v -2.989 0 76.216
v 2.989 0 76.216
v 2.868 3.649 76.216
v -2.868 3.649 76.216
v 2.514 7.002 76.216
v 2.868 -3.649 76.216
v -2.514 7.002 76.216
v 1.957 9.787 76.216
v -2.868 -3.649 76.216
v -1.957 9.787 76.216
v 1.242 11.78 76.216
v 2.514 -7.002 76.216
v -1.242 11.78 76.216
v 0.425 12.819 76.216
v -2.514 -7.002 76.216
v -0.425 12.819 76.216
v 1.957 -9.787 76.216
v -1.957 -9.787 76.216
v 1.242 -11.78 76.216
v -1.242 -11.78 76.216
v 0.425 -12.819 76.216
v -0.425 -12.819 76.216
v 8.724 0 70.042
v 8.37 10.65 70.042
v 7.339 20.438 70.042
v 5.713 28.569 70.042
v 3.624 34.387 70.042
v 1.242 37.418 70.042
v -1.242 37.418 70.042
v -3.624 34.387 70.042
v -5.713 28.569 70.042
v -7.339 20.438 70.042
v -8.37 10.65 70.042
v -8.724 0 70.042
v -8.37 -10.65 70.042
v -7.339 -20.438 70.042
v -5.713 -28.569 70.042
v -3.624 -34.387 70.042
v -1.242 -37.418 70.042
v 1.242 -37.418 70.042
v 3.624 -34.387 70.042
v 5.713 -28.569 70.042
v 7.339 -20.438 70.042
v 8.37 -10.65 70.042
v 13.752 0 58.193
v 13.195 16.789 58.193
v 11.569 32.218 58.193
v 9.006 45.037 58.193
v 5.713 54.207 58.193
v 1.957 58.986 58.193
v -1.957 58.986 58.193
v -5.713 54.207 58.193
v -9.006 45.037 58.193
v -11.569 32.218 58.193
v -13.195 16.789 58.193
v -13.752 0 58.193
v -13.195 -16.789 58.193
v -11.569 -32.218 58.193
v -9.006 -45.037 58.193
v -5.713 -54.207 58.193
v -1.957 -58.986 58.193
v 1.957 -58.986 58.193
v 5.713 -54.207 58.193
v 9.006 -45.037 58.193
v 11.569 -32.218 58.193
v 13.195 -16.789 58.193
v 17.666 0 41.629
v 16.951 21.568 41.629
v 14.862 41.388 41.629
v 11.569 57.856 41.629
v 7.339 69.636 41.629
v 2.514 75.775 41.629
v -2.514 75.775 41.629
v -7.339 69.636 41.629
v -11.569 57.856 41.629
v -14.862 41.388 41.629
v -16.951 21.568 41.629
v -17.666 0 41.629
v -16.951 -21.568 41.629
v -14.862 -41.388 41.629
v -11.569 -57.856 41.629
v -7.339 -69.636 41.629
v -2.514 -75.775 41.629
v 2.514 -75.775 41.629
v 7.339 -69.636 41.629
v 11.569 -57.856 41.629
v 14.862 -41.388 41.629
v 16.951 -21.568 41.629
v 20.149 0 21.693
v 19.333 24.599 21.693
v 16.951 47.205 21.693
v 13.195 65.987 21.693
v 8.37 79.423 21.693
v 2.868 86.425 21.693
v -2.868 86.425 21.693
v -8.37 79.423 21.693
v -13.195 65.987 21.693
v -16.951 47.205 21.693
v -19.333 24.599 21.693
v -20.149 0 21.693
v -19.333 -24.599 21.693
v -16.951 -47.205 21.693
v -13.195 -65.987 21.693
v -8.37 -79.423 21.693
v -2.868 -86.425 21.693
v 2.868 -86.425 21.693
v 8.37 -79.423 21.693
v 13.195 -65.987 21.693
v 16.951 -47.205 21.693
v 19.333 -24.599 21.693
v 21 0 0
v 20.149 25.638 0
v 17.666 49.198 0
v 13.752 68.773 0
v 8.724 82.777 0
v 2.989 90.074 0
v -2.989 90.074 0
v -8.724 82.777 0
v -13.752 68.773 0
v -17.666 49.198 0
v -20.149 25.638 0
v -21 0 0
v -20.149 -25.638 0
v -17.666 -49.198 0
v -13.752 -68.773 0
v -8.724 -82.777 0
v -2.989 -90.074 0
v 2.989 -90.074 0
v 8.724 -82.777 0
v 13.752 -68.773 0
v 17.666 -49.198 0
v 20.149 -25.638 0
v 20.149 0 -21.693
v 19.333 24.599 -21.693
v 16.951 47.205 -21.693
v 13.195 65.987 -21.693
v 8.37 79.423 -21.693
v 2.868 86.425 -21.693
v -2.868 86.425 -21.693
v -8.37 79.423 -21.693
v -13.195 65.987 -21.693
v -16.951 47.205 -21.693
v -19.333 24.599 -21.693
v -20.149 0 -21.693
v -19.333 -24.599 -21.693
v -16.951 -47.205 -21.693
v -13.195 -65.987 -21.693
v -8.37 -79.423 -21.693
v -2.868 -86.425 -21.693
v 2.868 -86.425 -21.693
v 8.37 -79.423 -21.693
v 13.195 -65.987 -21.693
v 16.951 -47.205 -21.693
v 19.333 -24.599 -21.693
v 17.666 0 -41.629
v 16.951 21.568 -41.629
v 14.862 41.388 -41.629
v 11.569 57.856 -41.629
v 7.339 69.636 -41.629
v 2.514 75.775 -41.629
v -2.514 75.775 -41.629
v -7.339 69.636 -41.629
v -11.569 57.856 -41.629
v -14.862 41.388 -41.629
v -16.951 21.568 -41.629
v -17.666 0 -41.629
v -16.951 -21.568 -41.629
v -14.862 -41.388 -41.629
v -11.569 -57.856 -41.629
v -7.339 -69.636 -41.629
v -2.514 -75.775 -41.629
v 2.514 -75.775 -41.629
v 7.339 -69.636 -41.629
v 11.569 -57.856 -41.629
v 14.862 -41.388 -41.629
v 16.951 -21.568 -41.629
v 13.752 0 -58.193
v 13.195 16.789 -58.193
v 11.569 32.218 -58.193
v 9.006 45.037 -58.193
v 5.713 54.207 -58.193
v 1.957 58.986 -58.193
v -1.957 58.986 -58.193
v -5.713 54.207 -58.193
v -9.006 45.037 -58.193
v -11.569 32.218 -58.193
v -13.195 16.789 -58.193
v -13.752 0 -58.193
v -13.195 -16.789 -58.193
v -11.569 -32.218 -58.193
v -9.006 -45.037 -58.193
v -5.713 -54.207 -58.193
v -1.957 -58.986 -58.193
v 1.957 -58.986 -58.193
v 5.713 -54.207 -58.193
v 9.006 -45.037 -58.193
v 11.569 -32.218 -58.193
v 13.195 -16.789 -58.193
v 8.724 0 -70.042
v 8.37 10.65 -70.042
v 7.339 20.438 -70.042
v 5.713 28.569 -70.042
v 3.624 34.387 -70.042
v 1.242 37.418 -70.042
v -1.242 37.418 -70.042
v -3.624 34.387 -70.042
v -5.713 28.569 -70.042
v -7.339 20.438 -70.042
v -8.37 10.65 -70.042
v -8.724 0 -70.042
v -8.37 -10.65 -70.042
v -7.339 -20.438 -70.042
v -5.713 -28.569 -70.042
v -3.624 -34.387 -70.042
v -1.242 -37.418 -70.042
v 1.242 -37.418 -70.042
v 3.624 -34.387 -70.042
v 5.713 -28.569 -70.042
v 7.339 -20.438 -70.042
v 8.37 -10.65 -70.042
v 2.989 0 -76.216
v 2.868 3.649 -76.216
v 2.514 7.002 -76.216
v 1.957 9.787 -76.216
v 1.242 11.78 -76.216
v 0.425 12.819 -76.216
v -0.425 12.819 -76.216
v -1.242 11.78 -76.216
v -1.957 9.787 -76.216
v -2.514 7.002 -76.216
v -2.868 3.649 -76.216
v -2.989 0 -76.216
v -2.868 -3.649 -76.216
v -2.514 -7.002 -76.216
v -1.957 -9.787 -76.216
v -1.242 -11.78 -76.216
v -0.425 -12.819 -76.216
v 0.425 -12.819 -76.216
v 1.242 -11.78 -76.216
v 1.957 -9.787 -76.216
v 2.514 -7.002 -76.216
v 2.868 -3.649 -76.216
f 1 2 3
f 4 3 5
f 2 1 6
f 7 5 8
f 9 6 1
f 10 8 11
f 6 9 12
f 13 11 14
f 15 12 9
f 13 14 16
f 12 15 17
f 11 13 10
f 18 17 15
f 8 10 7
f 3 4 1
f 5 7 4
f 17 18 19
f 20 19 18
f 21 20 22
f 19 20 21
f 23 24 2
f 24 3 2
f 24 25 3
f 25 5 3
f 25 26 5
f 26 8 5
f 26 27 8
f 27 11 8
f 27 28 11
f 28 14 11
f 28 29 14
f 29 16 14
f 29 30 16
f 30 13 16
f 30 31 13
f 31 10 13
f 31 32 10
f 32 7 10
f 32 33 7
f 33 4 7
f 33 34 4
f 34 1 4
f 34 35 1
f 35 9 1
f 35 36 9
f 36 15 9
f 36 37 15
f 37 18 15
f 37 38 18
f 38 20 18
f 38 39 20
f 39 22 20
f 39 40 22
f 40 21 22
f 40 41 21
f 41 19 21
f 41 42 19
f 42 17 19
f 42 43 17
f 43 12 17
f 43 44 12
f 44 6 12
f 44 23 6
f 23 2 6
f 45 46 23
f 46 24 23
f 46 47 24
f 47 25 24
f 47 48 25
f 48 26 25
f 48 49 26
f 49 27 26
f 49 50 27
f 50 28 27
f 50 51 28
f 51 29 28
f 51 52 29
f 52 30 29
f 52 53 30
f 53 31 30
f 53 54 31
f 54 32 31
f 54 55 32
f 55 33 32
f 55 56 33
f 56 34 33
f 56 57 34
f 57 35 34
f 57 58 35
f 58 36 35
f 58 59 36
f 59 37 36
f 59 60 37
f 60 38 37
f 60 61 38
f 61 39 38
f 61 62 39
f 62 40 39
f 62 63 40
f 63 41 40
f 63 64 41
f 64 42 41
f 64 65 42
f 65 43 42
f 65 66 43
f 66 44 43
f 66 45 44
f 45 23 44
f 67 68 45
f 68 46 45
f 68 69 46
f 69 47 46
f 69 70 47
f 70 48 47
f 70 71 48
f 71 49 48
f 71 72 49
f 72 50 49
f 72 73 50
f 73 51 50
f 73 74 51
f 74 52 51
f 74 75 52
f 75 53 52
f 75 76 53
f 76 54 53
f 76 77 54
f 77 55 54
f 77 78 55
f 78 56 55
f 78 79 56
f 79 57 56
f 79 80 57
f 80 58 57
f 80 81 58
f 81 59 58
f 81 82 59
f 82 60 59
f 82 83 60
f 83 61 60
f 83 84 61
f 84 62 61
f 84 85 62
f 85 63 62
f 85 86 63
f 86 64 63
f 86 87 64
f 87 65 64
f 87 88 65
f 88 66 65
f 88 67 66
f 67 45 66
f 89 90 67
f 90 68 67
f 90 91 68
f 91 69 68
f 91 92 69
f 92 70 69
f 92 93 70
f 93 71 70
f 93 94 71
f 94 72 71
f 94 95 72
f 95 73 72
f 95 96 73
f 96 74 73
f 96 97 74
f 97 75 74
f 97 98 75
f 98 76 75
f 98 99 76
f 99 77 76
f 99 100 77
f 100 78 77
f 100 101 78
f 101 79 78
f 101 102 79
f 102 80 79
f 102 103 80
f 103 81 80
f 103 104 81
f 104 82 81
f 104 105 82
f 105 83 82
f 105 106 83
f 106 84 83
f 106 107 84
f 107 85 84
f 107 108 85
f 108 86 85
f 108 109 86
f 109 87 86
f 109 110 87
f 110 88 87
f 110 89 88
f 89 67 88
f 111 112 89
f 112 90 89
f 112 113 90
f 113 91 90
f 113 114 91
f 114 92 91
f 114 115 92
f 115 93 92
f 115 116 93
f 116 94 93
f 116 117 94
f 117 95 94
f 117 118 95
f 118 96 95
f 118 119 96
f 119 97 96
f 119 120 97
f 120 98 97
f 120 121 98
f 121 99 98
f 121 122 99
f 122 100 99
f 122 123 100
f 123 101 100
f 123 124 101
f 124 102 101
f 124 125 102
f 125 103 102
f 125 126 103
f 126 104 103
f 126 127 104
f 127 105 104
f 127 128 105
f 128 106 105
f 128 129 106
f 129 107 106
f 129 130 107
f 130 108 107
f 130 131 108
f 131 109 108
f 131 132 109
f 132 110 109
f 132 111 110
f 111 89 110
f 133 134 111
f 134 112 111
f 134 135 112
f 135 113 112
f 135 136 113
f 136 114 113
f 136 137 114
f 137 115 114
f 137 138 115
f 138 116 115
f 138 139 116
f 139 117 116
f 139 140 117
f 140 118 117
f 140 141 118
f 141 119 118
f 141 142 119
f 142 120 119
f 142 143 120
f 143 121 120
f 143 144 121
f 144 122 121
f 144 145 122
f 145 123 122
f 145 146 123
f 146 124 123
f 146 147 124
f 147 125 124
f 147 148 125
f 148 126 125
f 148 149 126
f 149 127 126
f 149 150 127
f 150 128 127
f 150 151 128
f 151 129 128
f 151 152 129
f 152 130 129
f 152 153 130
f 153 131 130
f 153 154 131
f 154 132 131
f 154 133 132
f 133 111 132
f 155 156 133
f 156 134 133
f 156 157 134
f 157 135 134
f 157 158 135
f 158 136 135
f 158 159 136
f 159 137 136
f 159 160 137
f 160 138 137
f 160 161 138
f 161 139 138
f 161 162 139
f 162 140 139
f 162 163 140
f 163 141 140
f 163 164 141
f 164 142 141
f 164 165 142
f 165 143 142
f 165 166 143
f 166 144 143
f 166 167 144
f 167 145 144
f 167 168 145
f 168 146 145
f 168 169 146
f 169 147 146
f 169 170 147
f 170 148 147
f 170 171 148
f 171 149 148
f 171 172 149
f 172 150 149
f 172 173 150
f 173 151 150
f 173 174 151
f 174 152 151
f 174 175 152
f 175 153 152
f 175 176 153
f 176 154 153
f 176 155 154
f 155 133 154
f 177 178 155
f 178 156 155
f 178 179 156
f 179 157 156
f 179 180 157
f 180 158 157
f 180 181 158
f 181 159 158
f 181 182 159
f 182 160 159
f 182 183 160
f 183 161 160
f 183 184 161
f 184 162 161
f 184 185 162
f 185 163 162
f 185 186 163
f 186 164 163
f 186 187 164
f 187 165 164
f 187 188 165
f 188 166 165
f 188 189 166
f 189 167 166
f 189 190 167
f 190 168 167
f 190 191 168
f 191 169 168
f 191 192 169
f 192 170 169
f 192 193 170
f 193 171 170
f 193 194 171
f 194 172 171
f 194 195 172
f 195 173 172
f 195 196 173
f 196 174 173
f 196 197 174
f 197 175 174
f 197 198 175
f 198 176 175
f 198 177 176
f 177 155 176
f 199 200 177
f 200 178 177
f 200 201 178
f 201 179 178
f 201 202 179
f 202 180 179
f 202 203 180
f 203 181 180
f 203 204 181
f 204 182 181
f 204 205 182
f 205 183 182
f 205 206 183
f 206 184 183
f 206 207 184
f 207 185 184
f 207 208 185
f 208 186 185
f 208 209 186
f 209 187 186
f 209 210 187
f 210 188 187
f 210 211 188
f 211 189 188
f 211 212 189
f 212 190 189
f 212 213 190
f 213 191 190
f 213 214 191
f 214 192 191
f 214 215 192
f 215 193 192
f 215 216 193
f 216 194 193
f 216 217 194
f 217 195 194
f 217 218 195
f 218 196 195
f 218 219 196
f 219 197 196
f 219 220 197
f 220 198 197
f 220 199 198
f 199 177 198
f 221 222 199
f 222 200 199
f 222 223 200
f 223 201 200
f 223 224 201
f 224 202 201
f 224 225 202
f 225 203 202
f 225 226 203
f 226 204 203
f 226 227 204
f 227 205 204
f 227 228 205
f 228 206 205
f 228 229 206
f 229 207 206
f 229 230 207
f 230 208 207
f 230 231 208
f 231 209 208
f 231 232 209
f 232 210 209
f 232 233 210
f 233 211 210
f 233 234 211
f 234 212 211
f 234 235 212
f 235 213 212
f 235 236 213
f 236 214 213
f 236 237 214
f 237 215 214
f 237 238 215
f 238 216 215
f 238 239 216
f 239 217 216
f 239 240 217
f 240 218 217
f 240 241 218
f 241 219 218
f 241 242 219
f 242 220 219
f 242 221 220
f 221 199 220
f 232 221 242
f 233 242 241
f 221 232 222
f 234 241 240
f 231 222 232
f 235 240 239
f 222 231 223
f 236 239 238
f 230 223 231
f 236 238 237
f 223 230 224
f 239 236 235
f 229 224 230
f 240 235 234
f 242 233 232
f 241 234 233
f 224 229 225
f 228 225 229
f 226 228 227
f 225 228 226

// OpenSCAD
// Generated by SolidPython 1.0.1 on 2020-07-29 00:46:45


scale(v = [3, 13, 11]) {
	sphere(r = 7);
}
/***********************************************
*********      SolidPython code:      **********
************************************************
 
# import packages: SolidPython
from solid import *
from solid.utils import *
from itertools import chain, combinations, permutations


class Resize:

    def __init__(self, scad_file):
        self.scad_file = scad_file
        #self.scad_file = import_scad(scad_file)
        # cone/cylinder param:
        self.r1 = 0
        self.r2 = 0
        self.h = 0
        # rectangular prism param:
        self.w = 0
        self.l = 0
        # ellipse param:
        self.r = 0

    # import OpenScad code (file name corresponds to shape)


    # classify shape + parameters
    def assign(self, param1, param2, param3):
        if self.scad_file == 'cone.scad':
            self.r1 = param1
            self.r2 = param2
            self.h = param3
        elif self.scad_file == 'cylinder.scad':
            self.r1 = param1
            self.r2 = param2
            self.h = param3
        elif self.scad_file == 'rectangularPrism.scad':
            self.h = param1
            self.l = param2
            self.w = param3
        else:
            self.r = param1
            self.h = param2

    # resize parameters
    def iterate(self):
        x = range(3, 20, 2)
        i = 1
        if self.scad_file == 'cone.scad':
            tempList = list(permutations(x, 2))
            for temp in tempList:
                param1 = temp[0]
                param2 = temp[1]
                filepath = 'produced_scad_files/' + 'cone' + str(param1) + '_' + str(param2) + '_' + '.scad'
                scad_render_to_file(cylinder(h=param1, r1=param2, r2=0), filepath)

        elif self.scad_file == 'cylinder.scad':
            tempList = list(permutations(x, 3))
            for temp in tempList:
                param1 = temp[0]
                param2 = temp[1]
                filepath = 'produced_scad_files/' + 'cylinder' + str(param1) + '_' + str(param2) + '_' + '.scad'
                scad_render_to_file(cylinder(h=param1, r1=param2, r2=param2), filepath)

        elif self.scad_file == 'rectangularPrism.scad':
            tempList = list(permutations(x, 3))
            for temp in tempList:
                param1 = temp[0]
                param2 = temp[1]
                param3 = temp[2]
                filepath = 'produced_scad_files/' + 'rectangularPrism' + str(param1) + '_' + str(param2) + '_' + str(
                    param3) + '.scad'
                scad_render_to_file(cube(size=(param1, param2, param3)), filepath)

        elif self.scad_file == 'ellipse.scad':
            tempList = list(permutations(x, 4))
            for temp in tempList:
                param1 = temp[0]
                param2 = temp[1]
                param3 = temp[2]
                param4 = temp[3]
                filepath = 'produced_scad_files/' + 'ellipse' + str(param1) + '_' + str(param2) + '_' + str(param3) + '_' + str(param4) + '.scad'
                scad_render_to_file(scale([param1, param2, param3])(sphere(r=param4)), filepath)

    def render_to_scadfile(self):
        scad_render_to_file(scad, 'example.scad') 
 
************************************************/
